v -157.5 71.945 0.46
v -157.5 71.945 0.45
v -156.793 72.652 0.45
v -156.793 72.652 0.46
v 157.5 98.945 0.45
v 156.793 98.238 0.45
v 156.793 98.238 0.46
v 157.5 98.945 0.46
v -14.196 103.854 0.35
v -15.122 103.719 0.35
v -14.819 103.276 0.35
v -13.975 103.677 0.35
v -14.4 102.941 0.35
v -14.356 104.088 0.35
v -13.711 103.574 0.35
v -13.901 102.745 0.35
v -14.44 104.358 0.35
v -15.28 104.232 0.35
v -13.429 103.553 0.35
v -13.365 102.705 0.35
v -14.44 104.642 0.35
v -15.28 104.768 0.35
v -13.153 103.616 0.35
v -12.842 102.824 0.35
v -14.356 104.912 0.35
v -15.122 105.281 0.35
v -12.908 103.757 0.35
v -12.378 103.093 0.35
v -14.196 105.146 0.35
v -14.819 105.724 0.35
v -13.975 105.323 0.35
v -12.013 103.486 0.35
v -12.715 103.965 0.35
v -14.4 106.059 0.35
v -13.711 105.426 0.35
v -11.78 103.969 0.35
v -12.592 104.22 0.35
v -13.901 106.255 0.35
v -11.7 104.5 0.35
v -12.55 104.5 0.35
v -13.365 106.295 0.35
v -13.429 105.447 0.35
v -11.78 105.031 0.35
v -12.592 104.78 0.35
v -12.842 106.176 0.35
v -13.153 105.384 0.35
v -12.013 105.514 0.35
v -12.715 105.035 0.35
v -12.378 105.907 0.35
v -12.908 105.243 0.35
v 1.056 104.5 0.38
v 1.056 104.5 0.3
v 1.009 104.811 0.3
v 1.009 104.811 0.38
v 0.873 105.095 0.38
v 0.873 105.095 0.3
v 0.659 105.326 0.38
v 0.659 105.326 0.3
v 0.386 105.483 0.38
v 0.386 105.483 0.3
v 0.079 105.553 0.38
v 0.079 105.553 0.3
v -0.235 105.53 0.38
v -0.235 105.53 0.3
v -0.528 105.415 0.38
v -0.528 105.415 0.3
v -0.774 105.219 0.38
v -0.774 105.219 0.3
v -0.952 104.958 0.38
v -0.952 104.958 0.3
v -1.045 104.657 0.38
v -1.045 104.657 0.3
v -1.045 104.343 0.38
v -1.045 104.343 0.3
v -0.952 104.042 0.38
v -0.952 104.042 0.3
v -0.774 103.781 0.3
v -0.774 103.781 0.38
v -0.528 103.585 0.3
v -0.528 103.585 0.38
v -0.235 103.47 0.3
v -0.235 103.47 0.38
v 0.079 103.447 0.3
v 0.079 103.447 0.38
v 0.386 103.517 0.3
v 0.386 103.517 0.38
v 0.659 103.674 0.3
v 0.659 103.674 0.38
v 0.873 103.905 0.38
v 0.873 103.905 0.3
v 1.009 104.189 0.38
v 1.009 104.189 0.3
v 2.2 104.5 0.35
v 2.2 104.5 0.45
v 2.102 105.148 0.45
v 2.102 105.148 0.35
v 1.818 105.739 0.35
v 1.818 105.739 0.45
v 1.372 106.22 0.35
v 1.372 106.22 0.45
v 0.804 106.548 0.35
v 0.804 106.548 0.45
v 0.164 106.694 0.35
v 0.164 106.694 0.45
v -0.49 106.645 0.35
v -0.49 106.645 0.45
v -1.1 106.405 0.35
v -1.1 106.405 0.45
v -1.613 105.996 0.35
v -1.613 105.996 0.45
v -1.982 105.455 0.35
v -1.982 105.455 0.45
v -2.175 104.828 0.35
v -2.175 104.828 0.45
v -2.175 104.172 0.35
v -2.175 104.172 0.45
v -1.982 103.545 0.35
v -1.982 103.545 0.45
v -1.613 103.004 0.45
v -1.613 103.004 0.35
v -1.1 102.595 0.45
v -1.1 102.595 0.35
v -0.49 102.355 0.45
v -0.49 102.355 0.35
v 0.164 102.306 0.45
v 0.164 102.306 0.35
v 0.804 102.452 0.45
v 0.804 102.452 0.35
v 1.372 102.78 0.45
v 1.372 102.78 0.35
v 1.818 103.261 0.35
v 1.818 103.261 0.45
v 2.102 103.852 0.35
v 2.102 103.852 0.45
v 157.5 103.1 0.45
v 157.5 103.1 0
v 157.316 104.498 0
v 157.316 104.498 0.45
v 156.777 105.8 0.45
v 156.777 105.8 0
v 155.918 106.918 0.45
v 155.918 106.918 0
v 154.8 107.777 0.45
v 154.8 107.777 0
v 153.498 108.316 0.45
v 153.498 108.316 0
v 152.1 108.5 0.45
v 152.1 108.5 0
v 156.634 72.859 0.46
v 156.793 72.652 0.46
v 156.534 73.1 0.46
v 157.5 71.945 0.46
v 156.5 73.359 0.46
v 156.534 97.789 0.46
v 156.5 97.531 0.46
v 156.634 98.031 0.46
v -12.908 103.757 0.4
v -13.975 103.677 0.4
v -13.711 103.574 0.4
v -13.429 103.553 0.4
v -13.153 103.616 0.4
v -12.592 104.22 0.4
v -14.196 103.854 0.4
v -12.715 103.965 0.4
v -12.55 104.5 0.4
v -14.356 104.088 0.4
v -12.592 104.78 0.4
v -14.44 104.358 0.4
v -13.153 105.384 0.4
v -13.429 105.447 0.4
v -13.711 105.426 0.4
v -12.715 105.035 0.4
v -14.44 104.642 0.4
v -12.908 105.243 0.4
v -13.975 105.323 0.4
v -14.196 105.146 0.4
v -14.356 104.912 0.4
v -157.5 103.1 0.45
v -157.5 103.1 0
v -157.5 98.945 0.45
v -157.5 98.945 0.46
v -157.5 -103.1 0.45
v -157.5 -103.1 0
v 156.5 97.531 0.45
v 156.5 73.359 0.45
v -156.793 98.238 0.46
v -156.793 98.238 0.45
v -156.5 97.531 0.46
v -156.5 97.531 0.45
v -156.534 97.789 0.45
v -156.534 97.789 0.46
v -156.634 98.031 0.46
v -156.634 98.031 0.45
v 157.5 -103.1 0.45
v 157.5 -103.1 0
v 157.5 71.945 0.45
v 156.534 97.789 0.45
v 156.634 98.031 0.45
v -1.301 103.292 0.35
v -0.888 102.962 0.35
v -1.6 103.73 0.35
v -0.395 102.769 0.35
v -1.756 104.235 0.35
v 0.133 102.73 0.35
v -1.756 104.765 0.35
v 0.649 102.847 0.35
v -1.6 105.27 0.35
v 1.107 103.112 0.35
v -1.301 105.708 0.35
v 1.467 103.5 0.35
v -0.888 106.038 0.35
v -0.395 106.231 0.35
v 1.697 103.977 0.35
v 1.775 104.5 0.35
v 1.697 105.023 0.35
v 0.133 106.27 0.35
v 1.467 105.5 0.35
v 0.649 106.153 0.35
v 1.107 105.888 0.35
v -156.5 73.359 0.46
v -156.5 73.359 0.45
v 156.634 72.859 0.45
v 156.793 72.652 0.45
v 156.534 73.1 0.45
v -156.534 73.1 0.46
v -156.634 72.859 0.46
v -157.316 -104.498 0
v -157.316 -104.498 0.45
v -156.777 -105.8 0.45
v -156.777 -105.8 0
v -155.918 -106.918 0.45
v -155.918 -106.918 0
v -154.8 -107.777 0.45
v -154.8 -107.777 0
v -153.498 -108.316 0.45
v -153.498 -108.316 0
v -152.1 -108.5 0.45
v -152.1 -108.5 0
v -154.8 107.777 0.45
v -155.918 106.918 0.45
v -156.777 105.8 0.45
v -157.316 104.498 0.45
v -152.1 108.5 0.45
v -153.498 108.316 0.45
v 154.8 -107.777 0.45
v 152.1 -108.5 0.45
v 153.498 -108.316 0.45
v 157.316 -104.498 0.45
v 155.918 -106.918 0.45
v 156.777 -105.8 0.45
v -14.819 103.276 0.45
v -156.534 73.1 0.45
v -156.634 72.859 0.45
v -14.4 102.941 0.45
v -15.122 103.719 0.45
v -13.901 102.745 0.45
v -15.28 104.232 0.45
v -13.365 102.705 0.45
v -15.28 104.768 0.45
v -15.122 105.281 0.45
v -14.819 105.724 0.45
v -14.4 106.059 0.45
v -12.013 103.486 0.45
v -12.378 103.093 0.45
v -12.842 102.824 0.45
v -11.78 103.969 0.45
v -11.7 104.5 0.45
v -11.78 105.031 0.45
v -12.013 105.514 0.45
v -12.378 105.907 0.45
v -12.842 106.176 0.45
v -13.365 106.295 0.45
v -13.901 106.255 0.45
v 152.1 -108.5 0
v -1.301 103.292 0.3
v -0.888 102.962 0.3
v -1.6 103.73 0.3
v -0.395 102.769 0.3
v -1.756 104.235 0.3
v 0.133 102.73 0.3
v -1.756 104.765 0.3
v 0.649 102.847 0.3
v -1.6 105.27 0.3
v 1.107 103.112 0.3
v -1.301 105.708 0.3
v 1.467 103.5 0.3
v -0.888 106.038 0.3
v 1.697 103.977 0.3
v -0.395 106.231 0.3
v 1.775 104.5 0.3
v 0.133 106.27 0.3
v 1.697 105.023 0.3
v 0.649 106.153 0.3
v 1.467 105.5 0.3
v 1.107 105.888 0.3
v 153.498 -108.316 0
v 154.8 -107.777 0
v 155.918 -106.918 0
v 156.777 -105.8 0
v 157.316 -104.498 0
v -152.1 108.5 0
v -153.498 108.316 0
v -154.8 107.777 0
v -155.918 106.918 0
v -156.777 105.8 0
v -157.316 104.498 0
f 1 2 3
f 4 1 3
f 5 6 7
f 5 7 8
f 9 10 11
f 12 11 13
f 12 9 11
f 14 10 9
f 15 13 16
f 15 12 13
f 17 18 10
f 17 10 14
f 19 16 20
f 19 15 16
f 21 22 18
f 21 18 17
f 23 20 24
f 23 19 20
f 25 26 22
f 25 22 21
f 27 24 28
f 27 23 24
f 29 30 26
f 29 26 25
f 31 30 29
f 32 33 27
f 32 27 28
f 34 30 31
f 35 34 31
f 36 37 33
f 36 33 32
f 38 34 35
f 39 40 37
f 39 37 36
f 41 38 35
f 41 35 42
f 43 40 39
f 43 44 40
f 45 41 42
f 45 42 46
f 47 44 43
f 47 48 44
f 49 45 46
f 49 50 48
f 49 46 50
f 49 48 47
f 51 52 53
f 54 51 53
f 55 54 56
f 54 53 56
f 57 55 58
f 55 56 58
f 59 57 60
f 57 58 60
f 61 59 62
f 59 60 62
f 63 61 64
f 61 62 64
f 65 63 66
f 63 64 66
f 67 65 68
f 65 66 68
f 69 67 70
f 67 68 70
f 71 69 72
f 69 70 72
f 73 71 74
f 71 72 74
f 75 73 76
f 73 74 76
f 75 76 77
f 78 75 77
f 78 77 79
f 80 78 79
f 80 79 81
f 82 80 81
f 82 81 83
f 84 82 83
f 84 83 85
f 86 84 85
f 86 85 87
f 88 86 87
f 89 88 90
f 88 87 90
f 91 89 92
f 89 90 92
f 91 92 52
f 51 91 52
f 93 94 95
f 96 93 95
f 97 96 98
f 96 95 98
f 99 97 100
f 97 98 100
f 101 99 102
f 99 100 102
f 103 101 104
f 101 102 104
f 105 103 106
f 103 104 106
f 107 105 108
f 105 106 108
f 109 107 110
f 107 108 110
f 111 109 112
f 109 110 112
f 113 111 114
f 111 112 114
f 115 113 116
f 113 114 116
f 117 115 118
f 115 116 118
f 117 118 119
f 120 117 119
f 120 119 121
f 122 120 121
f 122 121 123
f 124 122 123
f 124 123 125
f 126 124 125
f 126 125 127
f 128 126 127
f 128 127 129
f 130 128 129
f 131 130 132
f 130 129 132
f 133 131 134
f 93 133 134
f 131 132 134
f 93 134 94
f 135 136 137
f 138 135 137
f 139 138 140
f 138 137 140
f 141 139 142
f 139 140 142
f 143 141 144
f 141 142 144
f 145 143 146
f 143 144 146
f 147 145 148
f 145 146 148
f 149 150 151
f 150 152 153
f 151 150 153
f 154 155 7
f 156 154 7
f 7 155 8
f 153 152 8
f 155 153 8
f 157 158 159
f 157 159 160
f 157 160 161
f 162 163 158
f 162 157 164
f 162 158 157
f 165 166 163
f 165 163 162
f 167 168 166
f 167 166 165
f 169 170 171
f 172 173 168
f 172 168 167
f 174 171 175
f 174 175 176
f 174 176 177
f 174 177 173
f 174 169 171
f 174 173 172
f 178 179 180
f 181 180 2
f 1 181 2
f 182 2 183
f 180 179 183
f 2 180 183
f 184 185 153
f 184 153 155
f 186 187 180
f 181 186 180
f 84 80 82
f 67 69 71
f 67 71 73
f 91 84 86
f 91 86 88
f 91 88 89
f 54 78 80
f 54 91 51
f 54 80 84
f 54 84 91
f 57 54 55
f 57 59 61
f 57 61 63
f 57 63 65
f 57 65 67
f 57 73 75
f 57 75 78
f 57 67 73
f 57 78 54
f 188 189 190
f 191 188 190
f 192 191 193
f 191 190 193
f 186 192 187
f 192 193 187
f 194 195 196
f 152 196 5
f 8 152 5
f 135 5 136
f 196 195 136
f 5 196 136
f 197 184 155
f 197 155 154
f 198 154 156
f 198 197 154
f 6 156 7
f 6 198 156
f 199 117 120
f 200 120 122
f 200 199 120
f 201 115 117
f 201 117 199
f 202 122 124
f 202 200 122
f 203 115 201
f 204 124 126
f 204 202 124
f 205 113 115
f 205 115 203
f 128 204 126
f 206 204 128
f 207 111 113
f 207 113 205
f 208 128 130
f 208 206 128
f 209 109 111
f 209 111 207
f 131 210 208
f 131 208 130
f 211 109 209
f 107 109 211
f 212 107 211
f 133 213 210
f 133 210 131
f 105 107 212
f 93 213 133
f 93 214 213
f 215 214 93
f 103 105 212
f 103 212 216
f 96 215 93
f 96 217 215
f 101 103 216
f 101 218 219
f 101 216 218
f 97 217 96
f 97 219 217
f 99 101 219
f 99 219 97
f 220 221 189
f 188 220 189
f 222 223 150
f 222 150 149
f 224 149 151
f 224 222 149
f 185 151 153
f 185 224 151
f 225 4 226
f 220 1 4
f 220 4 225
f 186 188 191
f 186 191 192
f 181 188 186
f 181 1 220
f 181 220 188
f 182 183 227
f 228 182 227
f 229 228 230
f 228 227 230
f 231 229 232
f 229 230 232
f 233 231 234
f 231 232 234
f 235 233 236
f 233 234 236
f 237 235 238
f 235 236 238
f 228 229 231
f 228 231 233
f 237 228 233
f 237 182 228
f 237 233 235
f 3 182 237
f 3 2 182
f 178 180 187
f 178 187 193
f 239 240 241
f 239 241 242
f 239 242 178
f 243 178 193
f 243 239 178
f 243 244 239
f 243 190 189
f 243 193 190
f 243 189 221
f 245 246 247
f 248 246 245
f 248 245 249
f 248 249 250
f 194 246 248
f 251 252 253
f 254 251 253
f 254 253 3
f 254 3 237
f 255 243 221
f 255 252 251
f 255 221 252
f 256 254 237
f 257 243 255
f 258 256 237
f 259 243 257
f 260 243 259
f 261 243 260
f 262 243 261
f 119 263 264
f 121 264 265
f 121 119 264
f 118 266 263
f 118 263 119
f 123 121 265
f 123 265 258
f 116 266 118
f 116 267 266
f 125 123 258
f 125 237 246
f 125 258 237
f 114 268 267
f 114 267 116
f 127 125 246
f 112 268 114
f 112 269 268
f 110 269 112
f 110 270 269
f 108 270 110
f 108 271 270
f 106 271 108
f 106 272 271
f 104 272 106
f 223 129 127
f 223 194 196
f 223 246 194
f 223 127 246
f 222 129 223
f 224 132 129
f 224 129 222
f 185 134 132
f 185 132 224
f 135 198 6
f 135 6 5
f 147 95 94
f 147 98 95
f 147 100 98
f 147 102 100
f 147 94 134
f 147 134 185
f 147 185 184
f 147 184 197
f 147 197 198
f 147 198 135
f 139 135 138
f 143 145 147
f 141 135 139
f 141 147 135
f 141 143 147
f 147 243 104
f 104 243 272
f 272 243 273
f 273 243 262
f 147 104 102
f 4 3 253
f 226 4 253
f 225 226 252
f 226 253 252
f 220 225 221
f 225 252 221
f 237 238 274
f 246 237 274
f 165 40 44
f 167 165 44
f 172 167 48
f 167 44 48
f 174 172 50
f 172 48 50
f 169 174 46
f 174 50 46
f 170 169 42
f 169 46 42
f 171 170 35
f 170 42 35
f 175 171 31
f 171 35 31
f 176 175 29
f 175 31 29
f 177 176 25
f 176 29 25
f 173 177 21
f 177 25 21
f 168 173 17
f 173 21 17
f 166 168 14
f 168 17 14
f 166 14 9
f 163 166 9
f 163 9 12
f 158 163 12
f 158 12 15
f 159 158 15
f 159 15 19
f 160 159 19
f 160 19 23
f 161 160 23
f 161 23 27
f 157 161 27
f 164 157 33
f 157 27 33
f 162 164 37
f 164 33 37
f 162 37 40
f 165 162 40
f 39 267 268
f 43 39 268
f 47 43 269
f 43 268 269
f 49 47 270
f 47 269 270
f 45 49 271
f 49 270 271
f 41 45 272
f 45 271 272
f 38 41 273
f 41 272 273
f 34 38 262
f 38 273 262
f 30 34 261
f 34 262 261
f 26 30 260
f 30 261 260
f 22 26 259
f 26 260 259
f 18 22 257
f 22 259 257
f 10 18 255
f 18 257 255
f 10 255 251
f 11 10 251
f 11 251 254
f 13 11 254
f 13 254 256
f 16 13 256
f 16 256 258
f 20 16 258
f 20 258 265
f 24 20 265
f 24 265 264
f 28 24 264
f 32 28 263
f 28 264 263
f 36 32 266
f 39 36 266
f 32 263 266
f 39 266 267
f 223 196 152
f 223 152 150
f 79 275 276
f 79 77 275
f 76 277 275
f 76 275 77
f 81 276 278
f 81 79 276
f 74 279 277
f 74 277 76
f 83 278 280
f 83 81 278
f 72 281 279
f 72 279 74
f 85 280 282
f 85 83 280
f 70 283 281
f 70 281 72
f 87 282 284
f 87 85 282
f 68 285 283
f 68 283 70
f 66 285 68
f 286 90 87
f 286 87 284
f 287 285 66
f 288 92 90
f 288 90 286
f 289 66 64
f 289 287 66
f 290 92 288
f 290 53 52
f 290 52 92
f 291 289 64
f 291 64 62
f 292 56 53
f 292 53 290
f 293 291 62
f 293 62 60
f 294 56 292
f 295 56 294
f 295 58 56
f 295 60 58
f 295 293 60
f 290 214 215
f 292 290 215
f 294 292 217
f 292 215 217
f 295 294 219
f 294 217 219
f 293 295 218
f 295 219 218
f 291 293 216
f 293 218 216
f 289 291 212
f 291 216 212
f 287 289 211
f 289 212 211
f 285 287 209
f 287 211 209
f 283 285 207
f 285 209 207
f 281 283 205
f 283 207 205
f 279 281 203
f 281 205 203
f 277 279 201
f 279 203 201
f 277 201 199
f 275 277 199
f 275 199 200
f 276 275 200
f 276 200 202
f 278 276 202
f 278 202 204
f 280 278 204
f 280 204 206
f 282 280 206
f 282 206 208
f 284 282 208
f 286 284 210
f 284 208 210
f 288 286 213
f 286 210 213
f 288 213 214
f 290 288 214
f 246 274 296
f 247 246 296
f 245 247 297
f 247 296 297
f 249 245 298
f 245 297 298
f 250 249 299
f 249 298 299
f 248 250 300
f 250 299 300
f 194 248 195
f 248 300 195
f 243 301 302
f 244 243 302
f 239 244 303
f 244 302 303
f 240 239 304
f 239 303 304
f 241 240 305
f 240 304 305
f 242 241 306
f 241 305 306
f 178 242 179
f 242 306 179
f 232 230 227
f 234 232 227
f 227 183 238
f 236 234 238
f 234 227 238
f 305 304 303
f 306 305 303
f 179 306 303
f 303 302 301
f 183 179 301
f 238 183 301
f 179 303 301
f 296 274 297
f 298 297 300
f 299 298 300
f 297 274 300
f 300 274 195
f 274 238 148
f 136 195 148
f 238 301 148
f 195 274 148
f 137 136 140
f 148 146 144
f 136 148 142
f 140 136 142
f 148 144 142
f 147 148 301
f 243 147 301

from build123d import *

# Parameters (mm, degrees)
BOSS_EXTRUDE1_DEPTH = 0.45
SKETCH3_R           = 2.2
SKETCH3_R_2         = 1.8
CUT_EXTRUDE1_DEPTH  = 0.1
SKETCH4_R           = 0.950130495
BOSS_EXTRUDE2_DEPTH = 0.05
SKETCH5_R           = 1.775413814
CUT_EXTRUDE2_DEPTH  = 0.05
SKETCH6_R           = 1.05635073
BOSS_EXTRUDE3_DEPTH = 0.08
BOSS_EXTRUDE5_DEPTH = 0.01


with BuildPart() as part:
    # Sketch1 → Boss-Extrude1 (new body)
    with BuildSketch(Plane.XY):
        with BuildLine():
            Line((-152.1, -108.5), (152.1, -108.5))
            ThreePointArc((152.1, -108.5), (155.918376618, -106.918376618), (157.5, -103.1))
            Line((157.5, -103.1), (157.5, 103.1))
            ThreePointArc((157.5, 103.1), (155.918376618, 106.918376618), (152.1, 108.5))
            Line((152.1, 108.5), (-152.1, 108.5))
            ThreePointArc((-152.1, 108.5), (-155.918376618, 106.918376618), (-157.5, 103.1))
            Line((-157.5, 103.1), (-157.5, -103.1))
            ThreePointArc((-157.5, -103.1), (-155.918376618, -106.918376618), (-152.1, -108.5))
        make_face()
    extrude(amount=BOSS_EXTRUDE1_DEPTH)

    # Sketch3 → Cut-Extrude1 (cut)
    with BuildSketch(Plane.XY.offset(0.45)):
        with Locations((0, 104.5)):
            Circle(SKETCH3_R)
        with Locations((-13.5, 104.5)):
            Circle(SKETCH3_R_2)
    extrude(amount=-CUT_EXTRUDE1_DEPTH, mode=Mode.SUBTRACT)

    # Sketch4 → Boss-Extrude2 (add)
    with BuildSketch(Plane.XY.offset(0.35)):
        with Locations((-13.5, 104.5)):
            Circle(SKETCH4_R)
    extrude(amount=BOSS_EXTRUDE2_DEPTH)

    # Sketch5 → Cut-Extrude2 (cut)
    with BuildSketch(Plane.XY.offset(0.35)):
        with Locations((0, 104.5)):
            Circle(SKETCH5_R)
    extrude(amount=-CUT_EXTRUDE2_DEPTH, mode=Mode.SUBTRACT)

    # Sketch6 → Boss-Extrude3 (add)
    with BuildSketch(Plane.XY.offset(0.3)):
        with Locations((0, 104.5)):
            Circle(SKETCH6_R)
    extrude(amount=BOSS_EXTRUDE3_DEPTH)

    # Sketch7 → Boss-Extrude5 (add)
    with BuildSketch(Plane.XY.offset(0.45)):
        with BuildLine():
            Line((157.5, 71.944818632), (156.792893219, 72.651925413))
            ThreePointArc((156.792893219, 72.651925413), (156.576120467, 72.976348762), (156.5, 73.359032194))
            Line((156.5, 73.359032194), (156.5, 97.530605069))
            ThreePointArc((156.5, 97.530605069), (156.576120467, 97.913288502), (156.792893219, 98.23771185))
            Line((156.792893219, 98.23771185), (157.5, 98.944818632))
            Line((157.5, 98.944818632), (157.5, 71.944818632))
        make_face()
        with BuildLine():
            Line((-157.5, 98.944818632), (-157.5, 71.944818632))
            Line((-157.5, 71.944818632), (-156.792893219, 72.651925413))
            ThreePointArc((-156.792893219, 72.651925413), (-156.576120467, 72.976348762), (-156.5, 73.359032194))
            Line((-156.5, 73.359032194), (-156.5, 97.530605069))
            ThreePointArc((-156.5, 97.530605069), (-156.576120467, 97.913288502), (-156.792893219, 98.23771185))
            Line((-156.792893219, 98.23771185), (-157.5, 98.944818632))
        make_face()
    extrude(amount=BOSS_EXTRUDE5_DEPTH)


solid = part.part
